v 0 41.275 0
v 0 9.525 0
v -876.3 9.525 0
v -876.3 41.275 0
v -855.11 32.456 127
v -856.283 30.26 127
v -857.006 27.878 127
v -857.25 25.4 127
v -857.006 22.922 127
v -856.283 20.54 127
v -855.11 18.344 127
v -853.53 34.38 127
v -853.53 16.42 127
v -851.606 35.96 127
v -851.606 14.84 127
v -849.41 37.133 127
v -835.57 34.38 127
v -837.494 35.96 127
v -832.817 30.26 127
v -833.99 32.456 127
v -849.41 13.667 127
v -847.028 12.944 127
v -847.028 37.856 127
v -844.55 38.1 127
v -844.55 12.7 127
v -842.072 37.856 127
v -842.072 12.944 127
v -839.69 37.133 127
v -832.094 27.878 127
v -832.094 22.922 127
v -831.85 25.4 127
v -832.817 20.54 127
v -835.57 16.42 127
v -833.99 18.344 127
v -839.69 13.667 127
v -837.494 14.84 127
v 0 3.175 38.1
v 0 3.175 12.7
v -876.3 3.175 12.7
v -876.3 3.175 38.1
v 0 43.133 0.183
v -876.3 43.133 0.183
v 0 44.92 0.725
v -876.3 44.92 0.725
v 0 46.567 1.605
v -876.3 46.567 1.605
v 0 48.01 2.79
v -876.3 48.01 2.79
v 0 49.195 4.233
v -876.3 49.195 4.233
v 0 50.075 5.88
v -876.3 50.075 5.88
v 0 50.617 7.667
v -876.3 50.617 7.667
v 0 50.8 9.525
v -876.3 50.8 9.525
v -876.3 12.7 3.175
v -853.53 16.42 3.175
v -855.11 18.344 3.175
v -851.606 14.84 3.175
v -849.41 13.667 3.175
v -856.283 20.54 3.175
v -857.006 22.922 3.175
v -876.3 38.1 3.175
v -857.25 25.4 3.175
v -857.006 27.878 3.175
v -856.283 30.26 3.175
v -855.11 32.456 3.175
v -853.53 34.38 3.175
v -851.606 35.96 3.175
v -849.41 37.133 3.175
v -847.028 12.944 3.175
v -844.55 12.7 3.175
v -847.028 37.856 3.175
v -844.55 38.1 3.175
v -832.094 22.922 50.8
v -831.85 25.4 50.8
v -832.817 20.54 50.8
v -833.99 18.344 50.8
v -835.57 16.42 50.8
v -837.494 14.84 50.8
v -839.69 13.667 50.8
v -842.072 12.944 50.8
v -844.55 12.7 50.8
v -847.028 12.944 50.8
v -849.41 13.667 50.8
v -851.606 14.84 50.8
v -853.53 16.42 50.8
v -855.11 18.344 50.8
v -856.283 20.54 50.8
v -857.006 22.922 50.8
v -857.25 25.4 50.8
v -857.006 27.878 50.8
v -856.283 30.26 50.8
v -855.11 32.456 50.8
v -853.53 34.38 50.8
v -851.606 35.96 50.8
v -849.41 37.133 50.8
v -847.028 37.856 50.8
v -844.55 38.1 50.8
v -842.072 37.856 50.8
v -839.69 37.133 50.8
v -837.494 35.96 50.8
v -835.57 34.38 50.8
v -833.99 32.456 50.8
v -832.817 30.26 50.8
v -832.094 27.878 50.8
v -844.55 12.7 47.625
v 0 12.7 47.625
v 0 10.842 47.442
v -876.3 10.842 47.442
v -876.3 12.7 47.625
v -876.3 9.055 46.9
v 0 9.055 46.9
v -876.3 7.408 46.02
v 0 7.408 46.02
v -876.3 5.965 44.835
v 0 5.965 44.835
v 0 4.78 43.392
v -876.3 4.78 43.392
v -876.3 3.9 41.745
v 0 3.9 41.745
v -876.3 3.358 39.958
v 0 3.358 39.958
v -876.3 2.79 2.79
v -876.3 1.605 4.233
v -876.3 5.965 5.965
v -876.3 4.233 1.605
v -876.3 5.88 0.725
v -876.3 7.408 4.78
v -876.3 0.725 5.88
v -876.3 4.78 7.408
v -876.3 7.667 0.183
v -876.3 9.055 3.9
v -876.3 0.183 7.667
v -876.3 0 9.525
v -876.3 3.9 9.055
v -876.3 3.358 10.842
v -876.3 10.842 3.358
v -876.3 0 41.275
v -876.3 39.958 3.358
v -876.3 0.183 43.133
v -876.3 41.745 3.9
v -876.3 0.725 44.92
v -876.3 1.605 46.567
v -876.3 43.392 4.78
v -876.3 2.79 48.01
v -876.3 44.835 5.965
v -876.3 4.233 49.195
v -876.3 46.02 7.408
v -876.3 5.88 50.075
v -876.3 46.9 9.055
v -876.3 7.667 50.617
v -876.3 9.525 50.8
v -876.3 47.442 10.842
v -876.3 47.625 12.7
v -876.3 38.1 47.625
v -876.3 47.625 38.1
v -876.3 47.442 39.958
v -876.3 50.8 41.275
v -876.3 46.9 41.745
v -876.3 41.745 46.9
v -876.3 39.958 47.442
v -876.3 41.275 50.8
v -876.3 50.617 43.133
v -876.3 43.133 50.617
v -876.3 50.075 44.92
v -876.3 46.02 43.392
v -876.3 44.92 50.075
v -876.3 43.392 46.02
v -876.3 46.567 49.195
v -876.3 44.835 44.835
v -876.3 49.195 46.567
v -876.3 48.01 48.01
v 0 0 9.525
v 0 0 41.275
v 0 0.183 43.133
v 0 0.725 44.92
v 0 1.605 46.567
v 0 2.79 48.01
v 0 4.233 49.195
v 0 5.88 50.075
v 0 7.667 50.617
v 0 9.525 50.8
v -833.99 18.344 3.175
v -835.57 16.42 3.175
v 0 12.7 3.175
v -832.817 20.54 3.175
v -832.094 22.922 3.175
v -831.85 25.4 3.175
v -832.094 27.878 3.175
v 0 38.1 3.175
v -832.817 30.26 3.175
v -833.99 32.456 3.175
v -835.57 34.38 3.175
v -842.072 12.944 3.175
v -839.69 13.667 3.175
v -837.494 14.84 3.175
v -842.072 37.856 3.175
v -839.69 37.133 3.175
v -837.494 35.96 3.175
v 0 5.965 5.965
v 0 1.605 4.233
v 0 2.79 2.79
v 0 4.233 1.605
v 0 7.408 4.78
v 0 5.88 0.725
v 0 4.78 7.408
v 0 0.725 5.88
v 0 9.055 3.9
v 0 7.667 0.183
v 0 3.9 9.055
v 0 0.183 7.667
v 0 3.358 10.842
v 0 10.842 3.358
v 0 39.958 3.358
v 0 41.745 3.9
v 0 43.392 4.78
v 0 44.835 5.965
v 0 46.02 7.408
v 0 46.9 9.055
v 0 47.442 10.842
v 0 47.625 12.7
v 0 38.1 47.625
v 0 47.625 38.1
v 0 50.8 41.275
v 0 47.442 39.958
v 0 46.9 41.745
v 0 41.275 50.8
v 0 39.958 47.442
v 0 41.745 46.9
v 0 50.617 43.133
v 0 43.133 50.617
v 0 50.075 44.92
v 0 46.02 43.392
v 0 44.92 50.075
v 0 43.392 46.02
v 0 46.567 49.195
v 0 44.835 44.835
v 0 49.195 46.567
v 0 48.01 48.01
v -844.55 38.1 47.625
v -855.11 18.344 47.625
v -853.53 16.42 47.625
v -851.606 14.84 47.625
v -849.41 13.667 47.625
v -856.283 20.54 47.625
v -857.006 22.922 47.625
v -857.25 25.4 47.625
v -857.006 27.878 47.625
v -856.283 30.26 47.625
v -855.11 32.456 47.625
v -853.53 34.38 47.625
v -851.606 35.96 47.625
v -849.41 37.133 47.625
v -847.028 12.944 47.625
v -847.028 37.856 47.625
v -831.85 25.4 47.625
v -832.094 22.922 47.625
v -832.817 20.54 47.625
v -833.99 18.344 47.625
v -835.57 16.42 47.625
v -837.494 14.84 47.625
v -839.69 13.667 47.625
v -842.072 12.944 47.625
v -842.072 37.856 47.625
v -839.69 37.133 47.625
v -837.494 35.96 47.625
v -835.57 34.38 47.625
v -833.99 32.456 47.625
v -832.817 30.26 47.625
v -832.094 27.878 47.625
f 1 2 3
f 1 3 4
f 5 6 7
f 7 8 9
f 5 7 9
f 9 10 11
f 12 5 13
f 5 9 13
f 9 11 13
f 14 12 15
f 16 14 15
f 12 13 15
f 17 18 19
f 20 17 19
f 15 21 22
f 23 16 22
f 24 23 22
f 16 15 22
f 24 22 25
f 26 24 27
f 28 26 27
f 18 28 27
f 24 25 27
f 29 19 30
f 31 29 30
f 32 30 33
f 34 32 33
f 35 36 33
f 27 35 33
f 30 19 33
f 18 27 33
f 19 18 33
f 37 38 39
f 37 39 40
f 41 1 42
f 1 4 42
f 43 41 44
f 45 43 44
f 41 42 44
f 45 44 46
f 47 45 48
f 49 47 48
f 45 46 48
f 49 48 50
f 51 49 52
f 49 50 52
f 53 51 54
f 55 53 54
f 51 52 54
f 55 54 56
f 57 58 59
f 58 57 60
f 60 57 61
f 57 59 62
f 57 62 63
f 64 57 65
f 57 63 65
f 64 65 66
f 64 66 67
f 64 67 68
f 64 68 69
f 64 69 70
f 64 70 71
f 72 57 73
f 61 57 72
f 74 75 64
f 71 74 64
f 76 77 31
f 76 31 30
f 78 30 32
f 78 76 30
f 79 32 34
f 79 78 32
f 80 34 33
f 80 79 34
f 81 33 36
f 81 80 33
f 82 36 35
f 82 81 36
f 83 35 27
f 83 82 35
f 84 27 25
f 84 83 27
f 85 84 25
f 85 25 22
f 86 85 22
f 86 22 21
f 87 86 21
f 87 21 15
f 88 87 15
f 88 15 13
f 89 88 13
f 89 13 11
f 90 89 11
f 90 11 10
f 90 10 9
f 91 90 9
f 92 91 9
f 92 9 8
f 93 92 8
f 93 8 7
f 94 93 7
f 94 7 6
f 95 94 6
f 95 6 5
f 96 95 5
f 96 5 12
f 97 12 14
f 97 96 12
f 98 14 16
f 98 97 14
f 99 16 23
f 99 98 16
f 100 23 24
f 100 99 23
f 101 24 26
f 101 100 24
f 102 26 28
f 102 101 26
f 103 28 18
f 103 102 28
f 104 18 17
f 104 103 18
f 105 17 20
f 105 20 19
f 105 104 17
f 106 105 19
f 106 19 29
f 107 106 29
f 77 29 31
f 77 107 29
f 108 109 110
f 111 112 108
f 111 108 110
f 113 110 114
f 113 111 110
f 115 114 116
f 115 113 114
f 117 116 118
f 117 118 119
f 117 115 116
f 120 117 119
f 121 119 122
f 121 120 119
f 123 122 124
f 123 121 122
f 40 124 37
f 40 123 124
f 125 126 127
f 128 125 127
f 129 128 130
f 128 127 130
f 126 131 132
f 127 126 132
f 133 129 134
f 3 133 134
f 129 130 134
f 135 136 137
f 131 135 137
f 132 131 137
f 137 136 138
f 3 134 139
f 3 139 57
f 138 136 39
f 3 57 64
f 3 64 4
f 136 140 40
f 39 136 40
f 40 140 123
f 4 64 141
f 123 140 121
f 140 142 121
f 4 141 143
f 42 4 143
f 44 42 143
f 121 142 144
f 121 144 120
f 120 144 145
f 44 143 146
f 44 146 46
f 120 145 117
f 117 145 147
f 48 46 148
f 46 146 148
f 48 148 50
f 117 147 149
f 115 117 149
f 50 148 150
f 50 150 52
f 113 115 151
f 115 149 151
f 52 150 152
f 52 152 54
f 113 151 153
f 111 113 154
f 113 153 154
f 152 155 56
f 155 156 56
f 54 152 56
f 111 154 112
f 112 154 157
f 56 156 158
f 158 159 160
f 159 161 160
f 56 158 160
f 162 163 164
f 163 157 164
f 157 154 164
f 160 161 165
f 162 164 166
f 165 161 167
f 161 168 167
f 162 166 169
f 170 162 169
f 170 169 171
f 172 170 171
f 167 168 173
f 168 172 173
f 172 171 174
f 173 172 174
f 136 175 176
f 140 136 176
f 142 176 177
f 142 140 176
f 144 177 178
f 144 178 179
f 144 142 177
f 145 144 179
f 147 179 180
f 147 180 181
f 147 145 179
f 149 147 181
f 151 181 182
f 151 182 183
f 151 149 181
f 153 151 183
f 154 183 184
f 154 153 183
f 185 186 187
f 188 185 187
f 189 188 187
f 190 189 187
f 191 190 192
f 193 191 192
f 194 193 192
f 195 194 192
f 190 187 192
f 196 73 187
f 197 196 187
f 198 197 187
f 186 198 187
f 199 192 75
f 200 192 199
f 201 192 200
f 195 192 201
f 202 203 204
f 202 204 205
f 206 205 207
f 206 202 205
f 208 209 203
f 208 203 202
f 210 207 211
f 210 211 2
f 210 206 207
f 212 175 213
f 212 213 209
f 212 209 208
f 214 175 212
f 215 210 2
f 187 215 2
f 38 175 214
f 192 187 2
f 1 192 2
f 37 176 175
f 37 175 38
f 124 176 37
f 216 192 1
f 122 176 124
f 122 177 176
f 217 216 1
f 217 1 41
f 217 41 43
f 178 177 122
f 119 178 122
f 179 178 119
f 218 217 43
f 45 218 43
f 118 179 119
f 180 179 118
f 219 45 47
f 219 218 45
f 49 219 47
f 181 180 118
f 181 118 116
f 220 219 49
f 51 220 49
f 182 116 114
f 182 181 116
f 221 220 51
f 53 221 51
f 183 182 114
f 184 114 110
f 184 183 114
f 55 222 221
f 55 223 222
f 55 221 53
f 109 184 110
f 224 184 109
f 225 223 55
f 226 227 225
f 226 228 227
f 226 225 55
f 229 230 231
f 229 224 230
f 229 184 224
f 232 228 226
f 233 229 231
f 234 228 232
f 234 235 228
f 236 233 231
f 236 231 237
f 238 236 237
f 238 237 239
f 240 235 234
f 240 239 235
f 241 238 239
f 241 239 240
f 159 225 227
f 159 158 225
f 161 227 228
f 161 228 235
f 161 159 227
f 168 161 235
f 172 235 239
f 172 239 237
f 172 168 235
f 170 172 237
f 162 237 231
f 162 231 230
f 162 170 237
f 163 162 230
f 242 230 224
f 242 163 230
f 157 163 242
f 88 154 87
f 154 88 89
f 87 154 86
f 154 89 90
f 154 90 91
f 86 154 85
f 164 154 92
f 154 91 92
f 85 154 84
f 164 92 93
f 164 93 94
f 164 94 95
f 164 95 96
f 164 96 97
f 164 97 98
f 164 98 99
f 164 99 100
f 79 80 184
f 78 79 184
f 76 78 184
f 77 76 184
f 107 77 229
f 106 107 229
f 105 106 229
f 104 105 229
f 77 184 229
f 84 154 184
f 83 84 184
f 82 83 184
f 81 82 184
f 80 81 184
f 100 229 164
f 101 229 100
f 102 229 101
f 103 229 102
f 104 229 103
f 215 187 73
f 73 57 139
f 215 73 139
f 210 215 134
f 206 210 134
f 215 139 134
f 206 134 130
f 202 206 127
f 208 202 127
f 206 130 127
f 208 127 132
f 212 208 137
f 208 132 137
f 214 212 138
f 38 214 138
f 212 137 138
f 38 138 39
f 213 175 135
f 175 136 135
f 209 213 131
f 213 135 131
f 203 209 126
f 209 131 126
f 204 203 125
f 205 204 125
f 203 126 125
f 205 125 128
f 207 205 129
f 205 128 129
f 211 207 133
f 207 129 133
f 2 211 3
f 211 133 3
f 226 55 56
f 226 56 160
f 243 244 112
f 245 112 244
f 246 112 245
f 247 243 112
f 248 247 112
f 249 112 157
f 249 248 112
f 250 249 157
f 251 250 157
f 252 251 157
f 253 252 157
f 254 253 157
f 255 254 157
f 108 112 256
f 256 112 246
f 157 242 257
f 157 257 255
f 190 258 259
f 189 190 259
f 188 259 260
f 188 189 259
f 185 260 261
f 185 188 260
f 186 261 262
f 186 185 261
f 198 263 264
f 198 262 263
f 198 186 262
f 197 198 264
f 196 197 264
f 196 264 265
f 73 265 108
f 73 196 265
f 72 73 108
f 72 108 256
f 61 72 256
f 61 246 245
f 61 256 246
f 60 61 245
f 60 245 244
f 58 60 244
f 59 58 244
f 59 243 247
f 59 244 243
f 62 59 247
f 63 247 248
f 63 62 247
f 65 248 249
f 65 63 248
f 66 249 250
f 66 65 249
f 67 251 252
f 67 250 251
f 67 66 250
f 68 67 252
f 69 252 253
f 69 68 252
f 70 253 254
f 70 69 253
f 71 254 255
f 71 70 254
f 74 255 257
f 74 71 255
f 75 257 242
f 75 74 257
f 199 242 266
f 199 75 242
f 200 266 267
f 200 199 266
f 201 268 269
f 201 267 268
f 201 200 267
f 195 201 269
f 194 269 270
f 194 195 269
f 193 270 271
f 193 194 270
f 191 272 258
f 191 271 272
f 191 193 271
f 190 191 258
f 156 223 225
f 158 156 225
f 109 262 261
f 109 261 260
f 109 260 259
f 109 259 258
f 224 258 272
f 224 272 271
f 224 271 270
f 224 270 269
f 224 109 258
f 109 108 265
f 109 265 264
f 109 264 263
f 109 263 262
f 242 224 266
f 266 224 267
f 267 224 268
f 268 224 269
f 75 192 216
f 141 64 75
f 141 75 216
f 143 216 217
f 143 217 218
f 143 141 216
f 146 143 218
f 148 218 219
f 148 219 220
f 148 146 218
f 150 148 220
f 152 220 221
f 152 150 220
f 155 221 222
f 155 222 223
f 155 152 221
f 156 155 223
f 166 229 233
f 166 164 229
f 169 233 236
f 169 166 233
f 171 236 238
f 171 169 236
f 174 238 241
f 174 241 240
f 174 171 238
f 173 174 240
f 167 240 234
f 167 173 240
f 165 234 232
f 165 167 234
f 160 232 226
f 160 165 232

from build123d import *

# Parameters (mm, degrees)
F0_W     = 50.8
F0_H     = 50.8
F1_DEPTH = 876.3
F2_W     = 44.45
F2_H     = 44.45
F3_DEPTH = 876.3
F4_R     = 9.525
F5_R     = 12.7
F6_DEPTH = 50.8
F7_R     = 12.7
F8_DEPTH = 127


with BuildPart() as f1:
    # F0 (on Right) → F1 (new body)
    with BuildSketch(Plane.YZ):
        with Locations((25.4, 25.4)):
            Rectangle(F0_W, F0_H)
    extrude(amount=-F1_DEPTH)

    # F2 (on face) → F3 (cut)
    with BuildSketch(Plane.YZ):
        with Locations((25.4, 25.4)):
            Rectangle(F2_W, F2_H)
    extrude(amount=-F3_DEPTH, mode=Mode.SUBTRACT)

    # F4
    f4_edges = [f1.edges().sort_by_distance(p)[0] for p in [
        (-438.15, 3.175, 3.175),
        (-438.15, 47.625, 3.175),
        (-438.15, 47.625, 47.625),
        (-438.15, 3.175, 47.625),
        (-438.15, 50.8, 0),
        (-438.15, 50.8, 50.8),
        (-438.15, 0, 50.8),
        (-438.15, 0, 0),
    ]]
    fillet(f4_edges, radius=F4_R)

    # F5 (on face) → F6 (cut)
    with BuildSketch(Plane.XY.offset(50.8)):
        with Locations((-844.55, 25.4)):
            Circle(F5_R)
    extrude(amount=-F6_DEPTH, mode=Mode.SUBTRACT)

    # F7 (on face) → F8 (join)
    with BuildSketch(Plane(origin=(0, 0, 0), x_dir=(1, 0, 0), z_dir=(0, 0, -1))):
        with Locations((-844.55, -25.4)):
            Circle(F7_R)
    extrude(amount=-F8_DEPTH)


solid = f1.part
